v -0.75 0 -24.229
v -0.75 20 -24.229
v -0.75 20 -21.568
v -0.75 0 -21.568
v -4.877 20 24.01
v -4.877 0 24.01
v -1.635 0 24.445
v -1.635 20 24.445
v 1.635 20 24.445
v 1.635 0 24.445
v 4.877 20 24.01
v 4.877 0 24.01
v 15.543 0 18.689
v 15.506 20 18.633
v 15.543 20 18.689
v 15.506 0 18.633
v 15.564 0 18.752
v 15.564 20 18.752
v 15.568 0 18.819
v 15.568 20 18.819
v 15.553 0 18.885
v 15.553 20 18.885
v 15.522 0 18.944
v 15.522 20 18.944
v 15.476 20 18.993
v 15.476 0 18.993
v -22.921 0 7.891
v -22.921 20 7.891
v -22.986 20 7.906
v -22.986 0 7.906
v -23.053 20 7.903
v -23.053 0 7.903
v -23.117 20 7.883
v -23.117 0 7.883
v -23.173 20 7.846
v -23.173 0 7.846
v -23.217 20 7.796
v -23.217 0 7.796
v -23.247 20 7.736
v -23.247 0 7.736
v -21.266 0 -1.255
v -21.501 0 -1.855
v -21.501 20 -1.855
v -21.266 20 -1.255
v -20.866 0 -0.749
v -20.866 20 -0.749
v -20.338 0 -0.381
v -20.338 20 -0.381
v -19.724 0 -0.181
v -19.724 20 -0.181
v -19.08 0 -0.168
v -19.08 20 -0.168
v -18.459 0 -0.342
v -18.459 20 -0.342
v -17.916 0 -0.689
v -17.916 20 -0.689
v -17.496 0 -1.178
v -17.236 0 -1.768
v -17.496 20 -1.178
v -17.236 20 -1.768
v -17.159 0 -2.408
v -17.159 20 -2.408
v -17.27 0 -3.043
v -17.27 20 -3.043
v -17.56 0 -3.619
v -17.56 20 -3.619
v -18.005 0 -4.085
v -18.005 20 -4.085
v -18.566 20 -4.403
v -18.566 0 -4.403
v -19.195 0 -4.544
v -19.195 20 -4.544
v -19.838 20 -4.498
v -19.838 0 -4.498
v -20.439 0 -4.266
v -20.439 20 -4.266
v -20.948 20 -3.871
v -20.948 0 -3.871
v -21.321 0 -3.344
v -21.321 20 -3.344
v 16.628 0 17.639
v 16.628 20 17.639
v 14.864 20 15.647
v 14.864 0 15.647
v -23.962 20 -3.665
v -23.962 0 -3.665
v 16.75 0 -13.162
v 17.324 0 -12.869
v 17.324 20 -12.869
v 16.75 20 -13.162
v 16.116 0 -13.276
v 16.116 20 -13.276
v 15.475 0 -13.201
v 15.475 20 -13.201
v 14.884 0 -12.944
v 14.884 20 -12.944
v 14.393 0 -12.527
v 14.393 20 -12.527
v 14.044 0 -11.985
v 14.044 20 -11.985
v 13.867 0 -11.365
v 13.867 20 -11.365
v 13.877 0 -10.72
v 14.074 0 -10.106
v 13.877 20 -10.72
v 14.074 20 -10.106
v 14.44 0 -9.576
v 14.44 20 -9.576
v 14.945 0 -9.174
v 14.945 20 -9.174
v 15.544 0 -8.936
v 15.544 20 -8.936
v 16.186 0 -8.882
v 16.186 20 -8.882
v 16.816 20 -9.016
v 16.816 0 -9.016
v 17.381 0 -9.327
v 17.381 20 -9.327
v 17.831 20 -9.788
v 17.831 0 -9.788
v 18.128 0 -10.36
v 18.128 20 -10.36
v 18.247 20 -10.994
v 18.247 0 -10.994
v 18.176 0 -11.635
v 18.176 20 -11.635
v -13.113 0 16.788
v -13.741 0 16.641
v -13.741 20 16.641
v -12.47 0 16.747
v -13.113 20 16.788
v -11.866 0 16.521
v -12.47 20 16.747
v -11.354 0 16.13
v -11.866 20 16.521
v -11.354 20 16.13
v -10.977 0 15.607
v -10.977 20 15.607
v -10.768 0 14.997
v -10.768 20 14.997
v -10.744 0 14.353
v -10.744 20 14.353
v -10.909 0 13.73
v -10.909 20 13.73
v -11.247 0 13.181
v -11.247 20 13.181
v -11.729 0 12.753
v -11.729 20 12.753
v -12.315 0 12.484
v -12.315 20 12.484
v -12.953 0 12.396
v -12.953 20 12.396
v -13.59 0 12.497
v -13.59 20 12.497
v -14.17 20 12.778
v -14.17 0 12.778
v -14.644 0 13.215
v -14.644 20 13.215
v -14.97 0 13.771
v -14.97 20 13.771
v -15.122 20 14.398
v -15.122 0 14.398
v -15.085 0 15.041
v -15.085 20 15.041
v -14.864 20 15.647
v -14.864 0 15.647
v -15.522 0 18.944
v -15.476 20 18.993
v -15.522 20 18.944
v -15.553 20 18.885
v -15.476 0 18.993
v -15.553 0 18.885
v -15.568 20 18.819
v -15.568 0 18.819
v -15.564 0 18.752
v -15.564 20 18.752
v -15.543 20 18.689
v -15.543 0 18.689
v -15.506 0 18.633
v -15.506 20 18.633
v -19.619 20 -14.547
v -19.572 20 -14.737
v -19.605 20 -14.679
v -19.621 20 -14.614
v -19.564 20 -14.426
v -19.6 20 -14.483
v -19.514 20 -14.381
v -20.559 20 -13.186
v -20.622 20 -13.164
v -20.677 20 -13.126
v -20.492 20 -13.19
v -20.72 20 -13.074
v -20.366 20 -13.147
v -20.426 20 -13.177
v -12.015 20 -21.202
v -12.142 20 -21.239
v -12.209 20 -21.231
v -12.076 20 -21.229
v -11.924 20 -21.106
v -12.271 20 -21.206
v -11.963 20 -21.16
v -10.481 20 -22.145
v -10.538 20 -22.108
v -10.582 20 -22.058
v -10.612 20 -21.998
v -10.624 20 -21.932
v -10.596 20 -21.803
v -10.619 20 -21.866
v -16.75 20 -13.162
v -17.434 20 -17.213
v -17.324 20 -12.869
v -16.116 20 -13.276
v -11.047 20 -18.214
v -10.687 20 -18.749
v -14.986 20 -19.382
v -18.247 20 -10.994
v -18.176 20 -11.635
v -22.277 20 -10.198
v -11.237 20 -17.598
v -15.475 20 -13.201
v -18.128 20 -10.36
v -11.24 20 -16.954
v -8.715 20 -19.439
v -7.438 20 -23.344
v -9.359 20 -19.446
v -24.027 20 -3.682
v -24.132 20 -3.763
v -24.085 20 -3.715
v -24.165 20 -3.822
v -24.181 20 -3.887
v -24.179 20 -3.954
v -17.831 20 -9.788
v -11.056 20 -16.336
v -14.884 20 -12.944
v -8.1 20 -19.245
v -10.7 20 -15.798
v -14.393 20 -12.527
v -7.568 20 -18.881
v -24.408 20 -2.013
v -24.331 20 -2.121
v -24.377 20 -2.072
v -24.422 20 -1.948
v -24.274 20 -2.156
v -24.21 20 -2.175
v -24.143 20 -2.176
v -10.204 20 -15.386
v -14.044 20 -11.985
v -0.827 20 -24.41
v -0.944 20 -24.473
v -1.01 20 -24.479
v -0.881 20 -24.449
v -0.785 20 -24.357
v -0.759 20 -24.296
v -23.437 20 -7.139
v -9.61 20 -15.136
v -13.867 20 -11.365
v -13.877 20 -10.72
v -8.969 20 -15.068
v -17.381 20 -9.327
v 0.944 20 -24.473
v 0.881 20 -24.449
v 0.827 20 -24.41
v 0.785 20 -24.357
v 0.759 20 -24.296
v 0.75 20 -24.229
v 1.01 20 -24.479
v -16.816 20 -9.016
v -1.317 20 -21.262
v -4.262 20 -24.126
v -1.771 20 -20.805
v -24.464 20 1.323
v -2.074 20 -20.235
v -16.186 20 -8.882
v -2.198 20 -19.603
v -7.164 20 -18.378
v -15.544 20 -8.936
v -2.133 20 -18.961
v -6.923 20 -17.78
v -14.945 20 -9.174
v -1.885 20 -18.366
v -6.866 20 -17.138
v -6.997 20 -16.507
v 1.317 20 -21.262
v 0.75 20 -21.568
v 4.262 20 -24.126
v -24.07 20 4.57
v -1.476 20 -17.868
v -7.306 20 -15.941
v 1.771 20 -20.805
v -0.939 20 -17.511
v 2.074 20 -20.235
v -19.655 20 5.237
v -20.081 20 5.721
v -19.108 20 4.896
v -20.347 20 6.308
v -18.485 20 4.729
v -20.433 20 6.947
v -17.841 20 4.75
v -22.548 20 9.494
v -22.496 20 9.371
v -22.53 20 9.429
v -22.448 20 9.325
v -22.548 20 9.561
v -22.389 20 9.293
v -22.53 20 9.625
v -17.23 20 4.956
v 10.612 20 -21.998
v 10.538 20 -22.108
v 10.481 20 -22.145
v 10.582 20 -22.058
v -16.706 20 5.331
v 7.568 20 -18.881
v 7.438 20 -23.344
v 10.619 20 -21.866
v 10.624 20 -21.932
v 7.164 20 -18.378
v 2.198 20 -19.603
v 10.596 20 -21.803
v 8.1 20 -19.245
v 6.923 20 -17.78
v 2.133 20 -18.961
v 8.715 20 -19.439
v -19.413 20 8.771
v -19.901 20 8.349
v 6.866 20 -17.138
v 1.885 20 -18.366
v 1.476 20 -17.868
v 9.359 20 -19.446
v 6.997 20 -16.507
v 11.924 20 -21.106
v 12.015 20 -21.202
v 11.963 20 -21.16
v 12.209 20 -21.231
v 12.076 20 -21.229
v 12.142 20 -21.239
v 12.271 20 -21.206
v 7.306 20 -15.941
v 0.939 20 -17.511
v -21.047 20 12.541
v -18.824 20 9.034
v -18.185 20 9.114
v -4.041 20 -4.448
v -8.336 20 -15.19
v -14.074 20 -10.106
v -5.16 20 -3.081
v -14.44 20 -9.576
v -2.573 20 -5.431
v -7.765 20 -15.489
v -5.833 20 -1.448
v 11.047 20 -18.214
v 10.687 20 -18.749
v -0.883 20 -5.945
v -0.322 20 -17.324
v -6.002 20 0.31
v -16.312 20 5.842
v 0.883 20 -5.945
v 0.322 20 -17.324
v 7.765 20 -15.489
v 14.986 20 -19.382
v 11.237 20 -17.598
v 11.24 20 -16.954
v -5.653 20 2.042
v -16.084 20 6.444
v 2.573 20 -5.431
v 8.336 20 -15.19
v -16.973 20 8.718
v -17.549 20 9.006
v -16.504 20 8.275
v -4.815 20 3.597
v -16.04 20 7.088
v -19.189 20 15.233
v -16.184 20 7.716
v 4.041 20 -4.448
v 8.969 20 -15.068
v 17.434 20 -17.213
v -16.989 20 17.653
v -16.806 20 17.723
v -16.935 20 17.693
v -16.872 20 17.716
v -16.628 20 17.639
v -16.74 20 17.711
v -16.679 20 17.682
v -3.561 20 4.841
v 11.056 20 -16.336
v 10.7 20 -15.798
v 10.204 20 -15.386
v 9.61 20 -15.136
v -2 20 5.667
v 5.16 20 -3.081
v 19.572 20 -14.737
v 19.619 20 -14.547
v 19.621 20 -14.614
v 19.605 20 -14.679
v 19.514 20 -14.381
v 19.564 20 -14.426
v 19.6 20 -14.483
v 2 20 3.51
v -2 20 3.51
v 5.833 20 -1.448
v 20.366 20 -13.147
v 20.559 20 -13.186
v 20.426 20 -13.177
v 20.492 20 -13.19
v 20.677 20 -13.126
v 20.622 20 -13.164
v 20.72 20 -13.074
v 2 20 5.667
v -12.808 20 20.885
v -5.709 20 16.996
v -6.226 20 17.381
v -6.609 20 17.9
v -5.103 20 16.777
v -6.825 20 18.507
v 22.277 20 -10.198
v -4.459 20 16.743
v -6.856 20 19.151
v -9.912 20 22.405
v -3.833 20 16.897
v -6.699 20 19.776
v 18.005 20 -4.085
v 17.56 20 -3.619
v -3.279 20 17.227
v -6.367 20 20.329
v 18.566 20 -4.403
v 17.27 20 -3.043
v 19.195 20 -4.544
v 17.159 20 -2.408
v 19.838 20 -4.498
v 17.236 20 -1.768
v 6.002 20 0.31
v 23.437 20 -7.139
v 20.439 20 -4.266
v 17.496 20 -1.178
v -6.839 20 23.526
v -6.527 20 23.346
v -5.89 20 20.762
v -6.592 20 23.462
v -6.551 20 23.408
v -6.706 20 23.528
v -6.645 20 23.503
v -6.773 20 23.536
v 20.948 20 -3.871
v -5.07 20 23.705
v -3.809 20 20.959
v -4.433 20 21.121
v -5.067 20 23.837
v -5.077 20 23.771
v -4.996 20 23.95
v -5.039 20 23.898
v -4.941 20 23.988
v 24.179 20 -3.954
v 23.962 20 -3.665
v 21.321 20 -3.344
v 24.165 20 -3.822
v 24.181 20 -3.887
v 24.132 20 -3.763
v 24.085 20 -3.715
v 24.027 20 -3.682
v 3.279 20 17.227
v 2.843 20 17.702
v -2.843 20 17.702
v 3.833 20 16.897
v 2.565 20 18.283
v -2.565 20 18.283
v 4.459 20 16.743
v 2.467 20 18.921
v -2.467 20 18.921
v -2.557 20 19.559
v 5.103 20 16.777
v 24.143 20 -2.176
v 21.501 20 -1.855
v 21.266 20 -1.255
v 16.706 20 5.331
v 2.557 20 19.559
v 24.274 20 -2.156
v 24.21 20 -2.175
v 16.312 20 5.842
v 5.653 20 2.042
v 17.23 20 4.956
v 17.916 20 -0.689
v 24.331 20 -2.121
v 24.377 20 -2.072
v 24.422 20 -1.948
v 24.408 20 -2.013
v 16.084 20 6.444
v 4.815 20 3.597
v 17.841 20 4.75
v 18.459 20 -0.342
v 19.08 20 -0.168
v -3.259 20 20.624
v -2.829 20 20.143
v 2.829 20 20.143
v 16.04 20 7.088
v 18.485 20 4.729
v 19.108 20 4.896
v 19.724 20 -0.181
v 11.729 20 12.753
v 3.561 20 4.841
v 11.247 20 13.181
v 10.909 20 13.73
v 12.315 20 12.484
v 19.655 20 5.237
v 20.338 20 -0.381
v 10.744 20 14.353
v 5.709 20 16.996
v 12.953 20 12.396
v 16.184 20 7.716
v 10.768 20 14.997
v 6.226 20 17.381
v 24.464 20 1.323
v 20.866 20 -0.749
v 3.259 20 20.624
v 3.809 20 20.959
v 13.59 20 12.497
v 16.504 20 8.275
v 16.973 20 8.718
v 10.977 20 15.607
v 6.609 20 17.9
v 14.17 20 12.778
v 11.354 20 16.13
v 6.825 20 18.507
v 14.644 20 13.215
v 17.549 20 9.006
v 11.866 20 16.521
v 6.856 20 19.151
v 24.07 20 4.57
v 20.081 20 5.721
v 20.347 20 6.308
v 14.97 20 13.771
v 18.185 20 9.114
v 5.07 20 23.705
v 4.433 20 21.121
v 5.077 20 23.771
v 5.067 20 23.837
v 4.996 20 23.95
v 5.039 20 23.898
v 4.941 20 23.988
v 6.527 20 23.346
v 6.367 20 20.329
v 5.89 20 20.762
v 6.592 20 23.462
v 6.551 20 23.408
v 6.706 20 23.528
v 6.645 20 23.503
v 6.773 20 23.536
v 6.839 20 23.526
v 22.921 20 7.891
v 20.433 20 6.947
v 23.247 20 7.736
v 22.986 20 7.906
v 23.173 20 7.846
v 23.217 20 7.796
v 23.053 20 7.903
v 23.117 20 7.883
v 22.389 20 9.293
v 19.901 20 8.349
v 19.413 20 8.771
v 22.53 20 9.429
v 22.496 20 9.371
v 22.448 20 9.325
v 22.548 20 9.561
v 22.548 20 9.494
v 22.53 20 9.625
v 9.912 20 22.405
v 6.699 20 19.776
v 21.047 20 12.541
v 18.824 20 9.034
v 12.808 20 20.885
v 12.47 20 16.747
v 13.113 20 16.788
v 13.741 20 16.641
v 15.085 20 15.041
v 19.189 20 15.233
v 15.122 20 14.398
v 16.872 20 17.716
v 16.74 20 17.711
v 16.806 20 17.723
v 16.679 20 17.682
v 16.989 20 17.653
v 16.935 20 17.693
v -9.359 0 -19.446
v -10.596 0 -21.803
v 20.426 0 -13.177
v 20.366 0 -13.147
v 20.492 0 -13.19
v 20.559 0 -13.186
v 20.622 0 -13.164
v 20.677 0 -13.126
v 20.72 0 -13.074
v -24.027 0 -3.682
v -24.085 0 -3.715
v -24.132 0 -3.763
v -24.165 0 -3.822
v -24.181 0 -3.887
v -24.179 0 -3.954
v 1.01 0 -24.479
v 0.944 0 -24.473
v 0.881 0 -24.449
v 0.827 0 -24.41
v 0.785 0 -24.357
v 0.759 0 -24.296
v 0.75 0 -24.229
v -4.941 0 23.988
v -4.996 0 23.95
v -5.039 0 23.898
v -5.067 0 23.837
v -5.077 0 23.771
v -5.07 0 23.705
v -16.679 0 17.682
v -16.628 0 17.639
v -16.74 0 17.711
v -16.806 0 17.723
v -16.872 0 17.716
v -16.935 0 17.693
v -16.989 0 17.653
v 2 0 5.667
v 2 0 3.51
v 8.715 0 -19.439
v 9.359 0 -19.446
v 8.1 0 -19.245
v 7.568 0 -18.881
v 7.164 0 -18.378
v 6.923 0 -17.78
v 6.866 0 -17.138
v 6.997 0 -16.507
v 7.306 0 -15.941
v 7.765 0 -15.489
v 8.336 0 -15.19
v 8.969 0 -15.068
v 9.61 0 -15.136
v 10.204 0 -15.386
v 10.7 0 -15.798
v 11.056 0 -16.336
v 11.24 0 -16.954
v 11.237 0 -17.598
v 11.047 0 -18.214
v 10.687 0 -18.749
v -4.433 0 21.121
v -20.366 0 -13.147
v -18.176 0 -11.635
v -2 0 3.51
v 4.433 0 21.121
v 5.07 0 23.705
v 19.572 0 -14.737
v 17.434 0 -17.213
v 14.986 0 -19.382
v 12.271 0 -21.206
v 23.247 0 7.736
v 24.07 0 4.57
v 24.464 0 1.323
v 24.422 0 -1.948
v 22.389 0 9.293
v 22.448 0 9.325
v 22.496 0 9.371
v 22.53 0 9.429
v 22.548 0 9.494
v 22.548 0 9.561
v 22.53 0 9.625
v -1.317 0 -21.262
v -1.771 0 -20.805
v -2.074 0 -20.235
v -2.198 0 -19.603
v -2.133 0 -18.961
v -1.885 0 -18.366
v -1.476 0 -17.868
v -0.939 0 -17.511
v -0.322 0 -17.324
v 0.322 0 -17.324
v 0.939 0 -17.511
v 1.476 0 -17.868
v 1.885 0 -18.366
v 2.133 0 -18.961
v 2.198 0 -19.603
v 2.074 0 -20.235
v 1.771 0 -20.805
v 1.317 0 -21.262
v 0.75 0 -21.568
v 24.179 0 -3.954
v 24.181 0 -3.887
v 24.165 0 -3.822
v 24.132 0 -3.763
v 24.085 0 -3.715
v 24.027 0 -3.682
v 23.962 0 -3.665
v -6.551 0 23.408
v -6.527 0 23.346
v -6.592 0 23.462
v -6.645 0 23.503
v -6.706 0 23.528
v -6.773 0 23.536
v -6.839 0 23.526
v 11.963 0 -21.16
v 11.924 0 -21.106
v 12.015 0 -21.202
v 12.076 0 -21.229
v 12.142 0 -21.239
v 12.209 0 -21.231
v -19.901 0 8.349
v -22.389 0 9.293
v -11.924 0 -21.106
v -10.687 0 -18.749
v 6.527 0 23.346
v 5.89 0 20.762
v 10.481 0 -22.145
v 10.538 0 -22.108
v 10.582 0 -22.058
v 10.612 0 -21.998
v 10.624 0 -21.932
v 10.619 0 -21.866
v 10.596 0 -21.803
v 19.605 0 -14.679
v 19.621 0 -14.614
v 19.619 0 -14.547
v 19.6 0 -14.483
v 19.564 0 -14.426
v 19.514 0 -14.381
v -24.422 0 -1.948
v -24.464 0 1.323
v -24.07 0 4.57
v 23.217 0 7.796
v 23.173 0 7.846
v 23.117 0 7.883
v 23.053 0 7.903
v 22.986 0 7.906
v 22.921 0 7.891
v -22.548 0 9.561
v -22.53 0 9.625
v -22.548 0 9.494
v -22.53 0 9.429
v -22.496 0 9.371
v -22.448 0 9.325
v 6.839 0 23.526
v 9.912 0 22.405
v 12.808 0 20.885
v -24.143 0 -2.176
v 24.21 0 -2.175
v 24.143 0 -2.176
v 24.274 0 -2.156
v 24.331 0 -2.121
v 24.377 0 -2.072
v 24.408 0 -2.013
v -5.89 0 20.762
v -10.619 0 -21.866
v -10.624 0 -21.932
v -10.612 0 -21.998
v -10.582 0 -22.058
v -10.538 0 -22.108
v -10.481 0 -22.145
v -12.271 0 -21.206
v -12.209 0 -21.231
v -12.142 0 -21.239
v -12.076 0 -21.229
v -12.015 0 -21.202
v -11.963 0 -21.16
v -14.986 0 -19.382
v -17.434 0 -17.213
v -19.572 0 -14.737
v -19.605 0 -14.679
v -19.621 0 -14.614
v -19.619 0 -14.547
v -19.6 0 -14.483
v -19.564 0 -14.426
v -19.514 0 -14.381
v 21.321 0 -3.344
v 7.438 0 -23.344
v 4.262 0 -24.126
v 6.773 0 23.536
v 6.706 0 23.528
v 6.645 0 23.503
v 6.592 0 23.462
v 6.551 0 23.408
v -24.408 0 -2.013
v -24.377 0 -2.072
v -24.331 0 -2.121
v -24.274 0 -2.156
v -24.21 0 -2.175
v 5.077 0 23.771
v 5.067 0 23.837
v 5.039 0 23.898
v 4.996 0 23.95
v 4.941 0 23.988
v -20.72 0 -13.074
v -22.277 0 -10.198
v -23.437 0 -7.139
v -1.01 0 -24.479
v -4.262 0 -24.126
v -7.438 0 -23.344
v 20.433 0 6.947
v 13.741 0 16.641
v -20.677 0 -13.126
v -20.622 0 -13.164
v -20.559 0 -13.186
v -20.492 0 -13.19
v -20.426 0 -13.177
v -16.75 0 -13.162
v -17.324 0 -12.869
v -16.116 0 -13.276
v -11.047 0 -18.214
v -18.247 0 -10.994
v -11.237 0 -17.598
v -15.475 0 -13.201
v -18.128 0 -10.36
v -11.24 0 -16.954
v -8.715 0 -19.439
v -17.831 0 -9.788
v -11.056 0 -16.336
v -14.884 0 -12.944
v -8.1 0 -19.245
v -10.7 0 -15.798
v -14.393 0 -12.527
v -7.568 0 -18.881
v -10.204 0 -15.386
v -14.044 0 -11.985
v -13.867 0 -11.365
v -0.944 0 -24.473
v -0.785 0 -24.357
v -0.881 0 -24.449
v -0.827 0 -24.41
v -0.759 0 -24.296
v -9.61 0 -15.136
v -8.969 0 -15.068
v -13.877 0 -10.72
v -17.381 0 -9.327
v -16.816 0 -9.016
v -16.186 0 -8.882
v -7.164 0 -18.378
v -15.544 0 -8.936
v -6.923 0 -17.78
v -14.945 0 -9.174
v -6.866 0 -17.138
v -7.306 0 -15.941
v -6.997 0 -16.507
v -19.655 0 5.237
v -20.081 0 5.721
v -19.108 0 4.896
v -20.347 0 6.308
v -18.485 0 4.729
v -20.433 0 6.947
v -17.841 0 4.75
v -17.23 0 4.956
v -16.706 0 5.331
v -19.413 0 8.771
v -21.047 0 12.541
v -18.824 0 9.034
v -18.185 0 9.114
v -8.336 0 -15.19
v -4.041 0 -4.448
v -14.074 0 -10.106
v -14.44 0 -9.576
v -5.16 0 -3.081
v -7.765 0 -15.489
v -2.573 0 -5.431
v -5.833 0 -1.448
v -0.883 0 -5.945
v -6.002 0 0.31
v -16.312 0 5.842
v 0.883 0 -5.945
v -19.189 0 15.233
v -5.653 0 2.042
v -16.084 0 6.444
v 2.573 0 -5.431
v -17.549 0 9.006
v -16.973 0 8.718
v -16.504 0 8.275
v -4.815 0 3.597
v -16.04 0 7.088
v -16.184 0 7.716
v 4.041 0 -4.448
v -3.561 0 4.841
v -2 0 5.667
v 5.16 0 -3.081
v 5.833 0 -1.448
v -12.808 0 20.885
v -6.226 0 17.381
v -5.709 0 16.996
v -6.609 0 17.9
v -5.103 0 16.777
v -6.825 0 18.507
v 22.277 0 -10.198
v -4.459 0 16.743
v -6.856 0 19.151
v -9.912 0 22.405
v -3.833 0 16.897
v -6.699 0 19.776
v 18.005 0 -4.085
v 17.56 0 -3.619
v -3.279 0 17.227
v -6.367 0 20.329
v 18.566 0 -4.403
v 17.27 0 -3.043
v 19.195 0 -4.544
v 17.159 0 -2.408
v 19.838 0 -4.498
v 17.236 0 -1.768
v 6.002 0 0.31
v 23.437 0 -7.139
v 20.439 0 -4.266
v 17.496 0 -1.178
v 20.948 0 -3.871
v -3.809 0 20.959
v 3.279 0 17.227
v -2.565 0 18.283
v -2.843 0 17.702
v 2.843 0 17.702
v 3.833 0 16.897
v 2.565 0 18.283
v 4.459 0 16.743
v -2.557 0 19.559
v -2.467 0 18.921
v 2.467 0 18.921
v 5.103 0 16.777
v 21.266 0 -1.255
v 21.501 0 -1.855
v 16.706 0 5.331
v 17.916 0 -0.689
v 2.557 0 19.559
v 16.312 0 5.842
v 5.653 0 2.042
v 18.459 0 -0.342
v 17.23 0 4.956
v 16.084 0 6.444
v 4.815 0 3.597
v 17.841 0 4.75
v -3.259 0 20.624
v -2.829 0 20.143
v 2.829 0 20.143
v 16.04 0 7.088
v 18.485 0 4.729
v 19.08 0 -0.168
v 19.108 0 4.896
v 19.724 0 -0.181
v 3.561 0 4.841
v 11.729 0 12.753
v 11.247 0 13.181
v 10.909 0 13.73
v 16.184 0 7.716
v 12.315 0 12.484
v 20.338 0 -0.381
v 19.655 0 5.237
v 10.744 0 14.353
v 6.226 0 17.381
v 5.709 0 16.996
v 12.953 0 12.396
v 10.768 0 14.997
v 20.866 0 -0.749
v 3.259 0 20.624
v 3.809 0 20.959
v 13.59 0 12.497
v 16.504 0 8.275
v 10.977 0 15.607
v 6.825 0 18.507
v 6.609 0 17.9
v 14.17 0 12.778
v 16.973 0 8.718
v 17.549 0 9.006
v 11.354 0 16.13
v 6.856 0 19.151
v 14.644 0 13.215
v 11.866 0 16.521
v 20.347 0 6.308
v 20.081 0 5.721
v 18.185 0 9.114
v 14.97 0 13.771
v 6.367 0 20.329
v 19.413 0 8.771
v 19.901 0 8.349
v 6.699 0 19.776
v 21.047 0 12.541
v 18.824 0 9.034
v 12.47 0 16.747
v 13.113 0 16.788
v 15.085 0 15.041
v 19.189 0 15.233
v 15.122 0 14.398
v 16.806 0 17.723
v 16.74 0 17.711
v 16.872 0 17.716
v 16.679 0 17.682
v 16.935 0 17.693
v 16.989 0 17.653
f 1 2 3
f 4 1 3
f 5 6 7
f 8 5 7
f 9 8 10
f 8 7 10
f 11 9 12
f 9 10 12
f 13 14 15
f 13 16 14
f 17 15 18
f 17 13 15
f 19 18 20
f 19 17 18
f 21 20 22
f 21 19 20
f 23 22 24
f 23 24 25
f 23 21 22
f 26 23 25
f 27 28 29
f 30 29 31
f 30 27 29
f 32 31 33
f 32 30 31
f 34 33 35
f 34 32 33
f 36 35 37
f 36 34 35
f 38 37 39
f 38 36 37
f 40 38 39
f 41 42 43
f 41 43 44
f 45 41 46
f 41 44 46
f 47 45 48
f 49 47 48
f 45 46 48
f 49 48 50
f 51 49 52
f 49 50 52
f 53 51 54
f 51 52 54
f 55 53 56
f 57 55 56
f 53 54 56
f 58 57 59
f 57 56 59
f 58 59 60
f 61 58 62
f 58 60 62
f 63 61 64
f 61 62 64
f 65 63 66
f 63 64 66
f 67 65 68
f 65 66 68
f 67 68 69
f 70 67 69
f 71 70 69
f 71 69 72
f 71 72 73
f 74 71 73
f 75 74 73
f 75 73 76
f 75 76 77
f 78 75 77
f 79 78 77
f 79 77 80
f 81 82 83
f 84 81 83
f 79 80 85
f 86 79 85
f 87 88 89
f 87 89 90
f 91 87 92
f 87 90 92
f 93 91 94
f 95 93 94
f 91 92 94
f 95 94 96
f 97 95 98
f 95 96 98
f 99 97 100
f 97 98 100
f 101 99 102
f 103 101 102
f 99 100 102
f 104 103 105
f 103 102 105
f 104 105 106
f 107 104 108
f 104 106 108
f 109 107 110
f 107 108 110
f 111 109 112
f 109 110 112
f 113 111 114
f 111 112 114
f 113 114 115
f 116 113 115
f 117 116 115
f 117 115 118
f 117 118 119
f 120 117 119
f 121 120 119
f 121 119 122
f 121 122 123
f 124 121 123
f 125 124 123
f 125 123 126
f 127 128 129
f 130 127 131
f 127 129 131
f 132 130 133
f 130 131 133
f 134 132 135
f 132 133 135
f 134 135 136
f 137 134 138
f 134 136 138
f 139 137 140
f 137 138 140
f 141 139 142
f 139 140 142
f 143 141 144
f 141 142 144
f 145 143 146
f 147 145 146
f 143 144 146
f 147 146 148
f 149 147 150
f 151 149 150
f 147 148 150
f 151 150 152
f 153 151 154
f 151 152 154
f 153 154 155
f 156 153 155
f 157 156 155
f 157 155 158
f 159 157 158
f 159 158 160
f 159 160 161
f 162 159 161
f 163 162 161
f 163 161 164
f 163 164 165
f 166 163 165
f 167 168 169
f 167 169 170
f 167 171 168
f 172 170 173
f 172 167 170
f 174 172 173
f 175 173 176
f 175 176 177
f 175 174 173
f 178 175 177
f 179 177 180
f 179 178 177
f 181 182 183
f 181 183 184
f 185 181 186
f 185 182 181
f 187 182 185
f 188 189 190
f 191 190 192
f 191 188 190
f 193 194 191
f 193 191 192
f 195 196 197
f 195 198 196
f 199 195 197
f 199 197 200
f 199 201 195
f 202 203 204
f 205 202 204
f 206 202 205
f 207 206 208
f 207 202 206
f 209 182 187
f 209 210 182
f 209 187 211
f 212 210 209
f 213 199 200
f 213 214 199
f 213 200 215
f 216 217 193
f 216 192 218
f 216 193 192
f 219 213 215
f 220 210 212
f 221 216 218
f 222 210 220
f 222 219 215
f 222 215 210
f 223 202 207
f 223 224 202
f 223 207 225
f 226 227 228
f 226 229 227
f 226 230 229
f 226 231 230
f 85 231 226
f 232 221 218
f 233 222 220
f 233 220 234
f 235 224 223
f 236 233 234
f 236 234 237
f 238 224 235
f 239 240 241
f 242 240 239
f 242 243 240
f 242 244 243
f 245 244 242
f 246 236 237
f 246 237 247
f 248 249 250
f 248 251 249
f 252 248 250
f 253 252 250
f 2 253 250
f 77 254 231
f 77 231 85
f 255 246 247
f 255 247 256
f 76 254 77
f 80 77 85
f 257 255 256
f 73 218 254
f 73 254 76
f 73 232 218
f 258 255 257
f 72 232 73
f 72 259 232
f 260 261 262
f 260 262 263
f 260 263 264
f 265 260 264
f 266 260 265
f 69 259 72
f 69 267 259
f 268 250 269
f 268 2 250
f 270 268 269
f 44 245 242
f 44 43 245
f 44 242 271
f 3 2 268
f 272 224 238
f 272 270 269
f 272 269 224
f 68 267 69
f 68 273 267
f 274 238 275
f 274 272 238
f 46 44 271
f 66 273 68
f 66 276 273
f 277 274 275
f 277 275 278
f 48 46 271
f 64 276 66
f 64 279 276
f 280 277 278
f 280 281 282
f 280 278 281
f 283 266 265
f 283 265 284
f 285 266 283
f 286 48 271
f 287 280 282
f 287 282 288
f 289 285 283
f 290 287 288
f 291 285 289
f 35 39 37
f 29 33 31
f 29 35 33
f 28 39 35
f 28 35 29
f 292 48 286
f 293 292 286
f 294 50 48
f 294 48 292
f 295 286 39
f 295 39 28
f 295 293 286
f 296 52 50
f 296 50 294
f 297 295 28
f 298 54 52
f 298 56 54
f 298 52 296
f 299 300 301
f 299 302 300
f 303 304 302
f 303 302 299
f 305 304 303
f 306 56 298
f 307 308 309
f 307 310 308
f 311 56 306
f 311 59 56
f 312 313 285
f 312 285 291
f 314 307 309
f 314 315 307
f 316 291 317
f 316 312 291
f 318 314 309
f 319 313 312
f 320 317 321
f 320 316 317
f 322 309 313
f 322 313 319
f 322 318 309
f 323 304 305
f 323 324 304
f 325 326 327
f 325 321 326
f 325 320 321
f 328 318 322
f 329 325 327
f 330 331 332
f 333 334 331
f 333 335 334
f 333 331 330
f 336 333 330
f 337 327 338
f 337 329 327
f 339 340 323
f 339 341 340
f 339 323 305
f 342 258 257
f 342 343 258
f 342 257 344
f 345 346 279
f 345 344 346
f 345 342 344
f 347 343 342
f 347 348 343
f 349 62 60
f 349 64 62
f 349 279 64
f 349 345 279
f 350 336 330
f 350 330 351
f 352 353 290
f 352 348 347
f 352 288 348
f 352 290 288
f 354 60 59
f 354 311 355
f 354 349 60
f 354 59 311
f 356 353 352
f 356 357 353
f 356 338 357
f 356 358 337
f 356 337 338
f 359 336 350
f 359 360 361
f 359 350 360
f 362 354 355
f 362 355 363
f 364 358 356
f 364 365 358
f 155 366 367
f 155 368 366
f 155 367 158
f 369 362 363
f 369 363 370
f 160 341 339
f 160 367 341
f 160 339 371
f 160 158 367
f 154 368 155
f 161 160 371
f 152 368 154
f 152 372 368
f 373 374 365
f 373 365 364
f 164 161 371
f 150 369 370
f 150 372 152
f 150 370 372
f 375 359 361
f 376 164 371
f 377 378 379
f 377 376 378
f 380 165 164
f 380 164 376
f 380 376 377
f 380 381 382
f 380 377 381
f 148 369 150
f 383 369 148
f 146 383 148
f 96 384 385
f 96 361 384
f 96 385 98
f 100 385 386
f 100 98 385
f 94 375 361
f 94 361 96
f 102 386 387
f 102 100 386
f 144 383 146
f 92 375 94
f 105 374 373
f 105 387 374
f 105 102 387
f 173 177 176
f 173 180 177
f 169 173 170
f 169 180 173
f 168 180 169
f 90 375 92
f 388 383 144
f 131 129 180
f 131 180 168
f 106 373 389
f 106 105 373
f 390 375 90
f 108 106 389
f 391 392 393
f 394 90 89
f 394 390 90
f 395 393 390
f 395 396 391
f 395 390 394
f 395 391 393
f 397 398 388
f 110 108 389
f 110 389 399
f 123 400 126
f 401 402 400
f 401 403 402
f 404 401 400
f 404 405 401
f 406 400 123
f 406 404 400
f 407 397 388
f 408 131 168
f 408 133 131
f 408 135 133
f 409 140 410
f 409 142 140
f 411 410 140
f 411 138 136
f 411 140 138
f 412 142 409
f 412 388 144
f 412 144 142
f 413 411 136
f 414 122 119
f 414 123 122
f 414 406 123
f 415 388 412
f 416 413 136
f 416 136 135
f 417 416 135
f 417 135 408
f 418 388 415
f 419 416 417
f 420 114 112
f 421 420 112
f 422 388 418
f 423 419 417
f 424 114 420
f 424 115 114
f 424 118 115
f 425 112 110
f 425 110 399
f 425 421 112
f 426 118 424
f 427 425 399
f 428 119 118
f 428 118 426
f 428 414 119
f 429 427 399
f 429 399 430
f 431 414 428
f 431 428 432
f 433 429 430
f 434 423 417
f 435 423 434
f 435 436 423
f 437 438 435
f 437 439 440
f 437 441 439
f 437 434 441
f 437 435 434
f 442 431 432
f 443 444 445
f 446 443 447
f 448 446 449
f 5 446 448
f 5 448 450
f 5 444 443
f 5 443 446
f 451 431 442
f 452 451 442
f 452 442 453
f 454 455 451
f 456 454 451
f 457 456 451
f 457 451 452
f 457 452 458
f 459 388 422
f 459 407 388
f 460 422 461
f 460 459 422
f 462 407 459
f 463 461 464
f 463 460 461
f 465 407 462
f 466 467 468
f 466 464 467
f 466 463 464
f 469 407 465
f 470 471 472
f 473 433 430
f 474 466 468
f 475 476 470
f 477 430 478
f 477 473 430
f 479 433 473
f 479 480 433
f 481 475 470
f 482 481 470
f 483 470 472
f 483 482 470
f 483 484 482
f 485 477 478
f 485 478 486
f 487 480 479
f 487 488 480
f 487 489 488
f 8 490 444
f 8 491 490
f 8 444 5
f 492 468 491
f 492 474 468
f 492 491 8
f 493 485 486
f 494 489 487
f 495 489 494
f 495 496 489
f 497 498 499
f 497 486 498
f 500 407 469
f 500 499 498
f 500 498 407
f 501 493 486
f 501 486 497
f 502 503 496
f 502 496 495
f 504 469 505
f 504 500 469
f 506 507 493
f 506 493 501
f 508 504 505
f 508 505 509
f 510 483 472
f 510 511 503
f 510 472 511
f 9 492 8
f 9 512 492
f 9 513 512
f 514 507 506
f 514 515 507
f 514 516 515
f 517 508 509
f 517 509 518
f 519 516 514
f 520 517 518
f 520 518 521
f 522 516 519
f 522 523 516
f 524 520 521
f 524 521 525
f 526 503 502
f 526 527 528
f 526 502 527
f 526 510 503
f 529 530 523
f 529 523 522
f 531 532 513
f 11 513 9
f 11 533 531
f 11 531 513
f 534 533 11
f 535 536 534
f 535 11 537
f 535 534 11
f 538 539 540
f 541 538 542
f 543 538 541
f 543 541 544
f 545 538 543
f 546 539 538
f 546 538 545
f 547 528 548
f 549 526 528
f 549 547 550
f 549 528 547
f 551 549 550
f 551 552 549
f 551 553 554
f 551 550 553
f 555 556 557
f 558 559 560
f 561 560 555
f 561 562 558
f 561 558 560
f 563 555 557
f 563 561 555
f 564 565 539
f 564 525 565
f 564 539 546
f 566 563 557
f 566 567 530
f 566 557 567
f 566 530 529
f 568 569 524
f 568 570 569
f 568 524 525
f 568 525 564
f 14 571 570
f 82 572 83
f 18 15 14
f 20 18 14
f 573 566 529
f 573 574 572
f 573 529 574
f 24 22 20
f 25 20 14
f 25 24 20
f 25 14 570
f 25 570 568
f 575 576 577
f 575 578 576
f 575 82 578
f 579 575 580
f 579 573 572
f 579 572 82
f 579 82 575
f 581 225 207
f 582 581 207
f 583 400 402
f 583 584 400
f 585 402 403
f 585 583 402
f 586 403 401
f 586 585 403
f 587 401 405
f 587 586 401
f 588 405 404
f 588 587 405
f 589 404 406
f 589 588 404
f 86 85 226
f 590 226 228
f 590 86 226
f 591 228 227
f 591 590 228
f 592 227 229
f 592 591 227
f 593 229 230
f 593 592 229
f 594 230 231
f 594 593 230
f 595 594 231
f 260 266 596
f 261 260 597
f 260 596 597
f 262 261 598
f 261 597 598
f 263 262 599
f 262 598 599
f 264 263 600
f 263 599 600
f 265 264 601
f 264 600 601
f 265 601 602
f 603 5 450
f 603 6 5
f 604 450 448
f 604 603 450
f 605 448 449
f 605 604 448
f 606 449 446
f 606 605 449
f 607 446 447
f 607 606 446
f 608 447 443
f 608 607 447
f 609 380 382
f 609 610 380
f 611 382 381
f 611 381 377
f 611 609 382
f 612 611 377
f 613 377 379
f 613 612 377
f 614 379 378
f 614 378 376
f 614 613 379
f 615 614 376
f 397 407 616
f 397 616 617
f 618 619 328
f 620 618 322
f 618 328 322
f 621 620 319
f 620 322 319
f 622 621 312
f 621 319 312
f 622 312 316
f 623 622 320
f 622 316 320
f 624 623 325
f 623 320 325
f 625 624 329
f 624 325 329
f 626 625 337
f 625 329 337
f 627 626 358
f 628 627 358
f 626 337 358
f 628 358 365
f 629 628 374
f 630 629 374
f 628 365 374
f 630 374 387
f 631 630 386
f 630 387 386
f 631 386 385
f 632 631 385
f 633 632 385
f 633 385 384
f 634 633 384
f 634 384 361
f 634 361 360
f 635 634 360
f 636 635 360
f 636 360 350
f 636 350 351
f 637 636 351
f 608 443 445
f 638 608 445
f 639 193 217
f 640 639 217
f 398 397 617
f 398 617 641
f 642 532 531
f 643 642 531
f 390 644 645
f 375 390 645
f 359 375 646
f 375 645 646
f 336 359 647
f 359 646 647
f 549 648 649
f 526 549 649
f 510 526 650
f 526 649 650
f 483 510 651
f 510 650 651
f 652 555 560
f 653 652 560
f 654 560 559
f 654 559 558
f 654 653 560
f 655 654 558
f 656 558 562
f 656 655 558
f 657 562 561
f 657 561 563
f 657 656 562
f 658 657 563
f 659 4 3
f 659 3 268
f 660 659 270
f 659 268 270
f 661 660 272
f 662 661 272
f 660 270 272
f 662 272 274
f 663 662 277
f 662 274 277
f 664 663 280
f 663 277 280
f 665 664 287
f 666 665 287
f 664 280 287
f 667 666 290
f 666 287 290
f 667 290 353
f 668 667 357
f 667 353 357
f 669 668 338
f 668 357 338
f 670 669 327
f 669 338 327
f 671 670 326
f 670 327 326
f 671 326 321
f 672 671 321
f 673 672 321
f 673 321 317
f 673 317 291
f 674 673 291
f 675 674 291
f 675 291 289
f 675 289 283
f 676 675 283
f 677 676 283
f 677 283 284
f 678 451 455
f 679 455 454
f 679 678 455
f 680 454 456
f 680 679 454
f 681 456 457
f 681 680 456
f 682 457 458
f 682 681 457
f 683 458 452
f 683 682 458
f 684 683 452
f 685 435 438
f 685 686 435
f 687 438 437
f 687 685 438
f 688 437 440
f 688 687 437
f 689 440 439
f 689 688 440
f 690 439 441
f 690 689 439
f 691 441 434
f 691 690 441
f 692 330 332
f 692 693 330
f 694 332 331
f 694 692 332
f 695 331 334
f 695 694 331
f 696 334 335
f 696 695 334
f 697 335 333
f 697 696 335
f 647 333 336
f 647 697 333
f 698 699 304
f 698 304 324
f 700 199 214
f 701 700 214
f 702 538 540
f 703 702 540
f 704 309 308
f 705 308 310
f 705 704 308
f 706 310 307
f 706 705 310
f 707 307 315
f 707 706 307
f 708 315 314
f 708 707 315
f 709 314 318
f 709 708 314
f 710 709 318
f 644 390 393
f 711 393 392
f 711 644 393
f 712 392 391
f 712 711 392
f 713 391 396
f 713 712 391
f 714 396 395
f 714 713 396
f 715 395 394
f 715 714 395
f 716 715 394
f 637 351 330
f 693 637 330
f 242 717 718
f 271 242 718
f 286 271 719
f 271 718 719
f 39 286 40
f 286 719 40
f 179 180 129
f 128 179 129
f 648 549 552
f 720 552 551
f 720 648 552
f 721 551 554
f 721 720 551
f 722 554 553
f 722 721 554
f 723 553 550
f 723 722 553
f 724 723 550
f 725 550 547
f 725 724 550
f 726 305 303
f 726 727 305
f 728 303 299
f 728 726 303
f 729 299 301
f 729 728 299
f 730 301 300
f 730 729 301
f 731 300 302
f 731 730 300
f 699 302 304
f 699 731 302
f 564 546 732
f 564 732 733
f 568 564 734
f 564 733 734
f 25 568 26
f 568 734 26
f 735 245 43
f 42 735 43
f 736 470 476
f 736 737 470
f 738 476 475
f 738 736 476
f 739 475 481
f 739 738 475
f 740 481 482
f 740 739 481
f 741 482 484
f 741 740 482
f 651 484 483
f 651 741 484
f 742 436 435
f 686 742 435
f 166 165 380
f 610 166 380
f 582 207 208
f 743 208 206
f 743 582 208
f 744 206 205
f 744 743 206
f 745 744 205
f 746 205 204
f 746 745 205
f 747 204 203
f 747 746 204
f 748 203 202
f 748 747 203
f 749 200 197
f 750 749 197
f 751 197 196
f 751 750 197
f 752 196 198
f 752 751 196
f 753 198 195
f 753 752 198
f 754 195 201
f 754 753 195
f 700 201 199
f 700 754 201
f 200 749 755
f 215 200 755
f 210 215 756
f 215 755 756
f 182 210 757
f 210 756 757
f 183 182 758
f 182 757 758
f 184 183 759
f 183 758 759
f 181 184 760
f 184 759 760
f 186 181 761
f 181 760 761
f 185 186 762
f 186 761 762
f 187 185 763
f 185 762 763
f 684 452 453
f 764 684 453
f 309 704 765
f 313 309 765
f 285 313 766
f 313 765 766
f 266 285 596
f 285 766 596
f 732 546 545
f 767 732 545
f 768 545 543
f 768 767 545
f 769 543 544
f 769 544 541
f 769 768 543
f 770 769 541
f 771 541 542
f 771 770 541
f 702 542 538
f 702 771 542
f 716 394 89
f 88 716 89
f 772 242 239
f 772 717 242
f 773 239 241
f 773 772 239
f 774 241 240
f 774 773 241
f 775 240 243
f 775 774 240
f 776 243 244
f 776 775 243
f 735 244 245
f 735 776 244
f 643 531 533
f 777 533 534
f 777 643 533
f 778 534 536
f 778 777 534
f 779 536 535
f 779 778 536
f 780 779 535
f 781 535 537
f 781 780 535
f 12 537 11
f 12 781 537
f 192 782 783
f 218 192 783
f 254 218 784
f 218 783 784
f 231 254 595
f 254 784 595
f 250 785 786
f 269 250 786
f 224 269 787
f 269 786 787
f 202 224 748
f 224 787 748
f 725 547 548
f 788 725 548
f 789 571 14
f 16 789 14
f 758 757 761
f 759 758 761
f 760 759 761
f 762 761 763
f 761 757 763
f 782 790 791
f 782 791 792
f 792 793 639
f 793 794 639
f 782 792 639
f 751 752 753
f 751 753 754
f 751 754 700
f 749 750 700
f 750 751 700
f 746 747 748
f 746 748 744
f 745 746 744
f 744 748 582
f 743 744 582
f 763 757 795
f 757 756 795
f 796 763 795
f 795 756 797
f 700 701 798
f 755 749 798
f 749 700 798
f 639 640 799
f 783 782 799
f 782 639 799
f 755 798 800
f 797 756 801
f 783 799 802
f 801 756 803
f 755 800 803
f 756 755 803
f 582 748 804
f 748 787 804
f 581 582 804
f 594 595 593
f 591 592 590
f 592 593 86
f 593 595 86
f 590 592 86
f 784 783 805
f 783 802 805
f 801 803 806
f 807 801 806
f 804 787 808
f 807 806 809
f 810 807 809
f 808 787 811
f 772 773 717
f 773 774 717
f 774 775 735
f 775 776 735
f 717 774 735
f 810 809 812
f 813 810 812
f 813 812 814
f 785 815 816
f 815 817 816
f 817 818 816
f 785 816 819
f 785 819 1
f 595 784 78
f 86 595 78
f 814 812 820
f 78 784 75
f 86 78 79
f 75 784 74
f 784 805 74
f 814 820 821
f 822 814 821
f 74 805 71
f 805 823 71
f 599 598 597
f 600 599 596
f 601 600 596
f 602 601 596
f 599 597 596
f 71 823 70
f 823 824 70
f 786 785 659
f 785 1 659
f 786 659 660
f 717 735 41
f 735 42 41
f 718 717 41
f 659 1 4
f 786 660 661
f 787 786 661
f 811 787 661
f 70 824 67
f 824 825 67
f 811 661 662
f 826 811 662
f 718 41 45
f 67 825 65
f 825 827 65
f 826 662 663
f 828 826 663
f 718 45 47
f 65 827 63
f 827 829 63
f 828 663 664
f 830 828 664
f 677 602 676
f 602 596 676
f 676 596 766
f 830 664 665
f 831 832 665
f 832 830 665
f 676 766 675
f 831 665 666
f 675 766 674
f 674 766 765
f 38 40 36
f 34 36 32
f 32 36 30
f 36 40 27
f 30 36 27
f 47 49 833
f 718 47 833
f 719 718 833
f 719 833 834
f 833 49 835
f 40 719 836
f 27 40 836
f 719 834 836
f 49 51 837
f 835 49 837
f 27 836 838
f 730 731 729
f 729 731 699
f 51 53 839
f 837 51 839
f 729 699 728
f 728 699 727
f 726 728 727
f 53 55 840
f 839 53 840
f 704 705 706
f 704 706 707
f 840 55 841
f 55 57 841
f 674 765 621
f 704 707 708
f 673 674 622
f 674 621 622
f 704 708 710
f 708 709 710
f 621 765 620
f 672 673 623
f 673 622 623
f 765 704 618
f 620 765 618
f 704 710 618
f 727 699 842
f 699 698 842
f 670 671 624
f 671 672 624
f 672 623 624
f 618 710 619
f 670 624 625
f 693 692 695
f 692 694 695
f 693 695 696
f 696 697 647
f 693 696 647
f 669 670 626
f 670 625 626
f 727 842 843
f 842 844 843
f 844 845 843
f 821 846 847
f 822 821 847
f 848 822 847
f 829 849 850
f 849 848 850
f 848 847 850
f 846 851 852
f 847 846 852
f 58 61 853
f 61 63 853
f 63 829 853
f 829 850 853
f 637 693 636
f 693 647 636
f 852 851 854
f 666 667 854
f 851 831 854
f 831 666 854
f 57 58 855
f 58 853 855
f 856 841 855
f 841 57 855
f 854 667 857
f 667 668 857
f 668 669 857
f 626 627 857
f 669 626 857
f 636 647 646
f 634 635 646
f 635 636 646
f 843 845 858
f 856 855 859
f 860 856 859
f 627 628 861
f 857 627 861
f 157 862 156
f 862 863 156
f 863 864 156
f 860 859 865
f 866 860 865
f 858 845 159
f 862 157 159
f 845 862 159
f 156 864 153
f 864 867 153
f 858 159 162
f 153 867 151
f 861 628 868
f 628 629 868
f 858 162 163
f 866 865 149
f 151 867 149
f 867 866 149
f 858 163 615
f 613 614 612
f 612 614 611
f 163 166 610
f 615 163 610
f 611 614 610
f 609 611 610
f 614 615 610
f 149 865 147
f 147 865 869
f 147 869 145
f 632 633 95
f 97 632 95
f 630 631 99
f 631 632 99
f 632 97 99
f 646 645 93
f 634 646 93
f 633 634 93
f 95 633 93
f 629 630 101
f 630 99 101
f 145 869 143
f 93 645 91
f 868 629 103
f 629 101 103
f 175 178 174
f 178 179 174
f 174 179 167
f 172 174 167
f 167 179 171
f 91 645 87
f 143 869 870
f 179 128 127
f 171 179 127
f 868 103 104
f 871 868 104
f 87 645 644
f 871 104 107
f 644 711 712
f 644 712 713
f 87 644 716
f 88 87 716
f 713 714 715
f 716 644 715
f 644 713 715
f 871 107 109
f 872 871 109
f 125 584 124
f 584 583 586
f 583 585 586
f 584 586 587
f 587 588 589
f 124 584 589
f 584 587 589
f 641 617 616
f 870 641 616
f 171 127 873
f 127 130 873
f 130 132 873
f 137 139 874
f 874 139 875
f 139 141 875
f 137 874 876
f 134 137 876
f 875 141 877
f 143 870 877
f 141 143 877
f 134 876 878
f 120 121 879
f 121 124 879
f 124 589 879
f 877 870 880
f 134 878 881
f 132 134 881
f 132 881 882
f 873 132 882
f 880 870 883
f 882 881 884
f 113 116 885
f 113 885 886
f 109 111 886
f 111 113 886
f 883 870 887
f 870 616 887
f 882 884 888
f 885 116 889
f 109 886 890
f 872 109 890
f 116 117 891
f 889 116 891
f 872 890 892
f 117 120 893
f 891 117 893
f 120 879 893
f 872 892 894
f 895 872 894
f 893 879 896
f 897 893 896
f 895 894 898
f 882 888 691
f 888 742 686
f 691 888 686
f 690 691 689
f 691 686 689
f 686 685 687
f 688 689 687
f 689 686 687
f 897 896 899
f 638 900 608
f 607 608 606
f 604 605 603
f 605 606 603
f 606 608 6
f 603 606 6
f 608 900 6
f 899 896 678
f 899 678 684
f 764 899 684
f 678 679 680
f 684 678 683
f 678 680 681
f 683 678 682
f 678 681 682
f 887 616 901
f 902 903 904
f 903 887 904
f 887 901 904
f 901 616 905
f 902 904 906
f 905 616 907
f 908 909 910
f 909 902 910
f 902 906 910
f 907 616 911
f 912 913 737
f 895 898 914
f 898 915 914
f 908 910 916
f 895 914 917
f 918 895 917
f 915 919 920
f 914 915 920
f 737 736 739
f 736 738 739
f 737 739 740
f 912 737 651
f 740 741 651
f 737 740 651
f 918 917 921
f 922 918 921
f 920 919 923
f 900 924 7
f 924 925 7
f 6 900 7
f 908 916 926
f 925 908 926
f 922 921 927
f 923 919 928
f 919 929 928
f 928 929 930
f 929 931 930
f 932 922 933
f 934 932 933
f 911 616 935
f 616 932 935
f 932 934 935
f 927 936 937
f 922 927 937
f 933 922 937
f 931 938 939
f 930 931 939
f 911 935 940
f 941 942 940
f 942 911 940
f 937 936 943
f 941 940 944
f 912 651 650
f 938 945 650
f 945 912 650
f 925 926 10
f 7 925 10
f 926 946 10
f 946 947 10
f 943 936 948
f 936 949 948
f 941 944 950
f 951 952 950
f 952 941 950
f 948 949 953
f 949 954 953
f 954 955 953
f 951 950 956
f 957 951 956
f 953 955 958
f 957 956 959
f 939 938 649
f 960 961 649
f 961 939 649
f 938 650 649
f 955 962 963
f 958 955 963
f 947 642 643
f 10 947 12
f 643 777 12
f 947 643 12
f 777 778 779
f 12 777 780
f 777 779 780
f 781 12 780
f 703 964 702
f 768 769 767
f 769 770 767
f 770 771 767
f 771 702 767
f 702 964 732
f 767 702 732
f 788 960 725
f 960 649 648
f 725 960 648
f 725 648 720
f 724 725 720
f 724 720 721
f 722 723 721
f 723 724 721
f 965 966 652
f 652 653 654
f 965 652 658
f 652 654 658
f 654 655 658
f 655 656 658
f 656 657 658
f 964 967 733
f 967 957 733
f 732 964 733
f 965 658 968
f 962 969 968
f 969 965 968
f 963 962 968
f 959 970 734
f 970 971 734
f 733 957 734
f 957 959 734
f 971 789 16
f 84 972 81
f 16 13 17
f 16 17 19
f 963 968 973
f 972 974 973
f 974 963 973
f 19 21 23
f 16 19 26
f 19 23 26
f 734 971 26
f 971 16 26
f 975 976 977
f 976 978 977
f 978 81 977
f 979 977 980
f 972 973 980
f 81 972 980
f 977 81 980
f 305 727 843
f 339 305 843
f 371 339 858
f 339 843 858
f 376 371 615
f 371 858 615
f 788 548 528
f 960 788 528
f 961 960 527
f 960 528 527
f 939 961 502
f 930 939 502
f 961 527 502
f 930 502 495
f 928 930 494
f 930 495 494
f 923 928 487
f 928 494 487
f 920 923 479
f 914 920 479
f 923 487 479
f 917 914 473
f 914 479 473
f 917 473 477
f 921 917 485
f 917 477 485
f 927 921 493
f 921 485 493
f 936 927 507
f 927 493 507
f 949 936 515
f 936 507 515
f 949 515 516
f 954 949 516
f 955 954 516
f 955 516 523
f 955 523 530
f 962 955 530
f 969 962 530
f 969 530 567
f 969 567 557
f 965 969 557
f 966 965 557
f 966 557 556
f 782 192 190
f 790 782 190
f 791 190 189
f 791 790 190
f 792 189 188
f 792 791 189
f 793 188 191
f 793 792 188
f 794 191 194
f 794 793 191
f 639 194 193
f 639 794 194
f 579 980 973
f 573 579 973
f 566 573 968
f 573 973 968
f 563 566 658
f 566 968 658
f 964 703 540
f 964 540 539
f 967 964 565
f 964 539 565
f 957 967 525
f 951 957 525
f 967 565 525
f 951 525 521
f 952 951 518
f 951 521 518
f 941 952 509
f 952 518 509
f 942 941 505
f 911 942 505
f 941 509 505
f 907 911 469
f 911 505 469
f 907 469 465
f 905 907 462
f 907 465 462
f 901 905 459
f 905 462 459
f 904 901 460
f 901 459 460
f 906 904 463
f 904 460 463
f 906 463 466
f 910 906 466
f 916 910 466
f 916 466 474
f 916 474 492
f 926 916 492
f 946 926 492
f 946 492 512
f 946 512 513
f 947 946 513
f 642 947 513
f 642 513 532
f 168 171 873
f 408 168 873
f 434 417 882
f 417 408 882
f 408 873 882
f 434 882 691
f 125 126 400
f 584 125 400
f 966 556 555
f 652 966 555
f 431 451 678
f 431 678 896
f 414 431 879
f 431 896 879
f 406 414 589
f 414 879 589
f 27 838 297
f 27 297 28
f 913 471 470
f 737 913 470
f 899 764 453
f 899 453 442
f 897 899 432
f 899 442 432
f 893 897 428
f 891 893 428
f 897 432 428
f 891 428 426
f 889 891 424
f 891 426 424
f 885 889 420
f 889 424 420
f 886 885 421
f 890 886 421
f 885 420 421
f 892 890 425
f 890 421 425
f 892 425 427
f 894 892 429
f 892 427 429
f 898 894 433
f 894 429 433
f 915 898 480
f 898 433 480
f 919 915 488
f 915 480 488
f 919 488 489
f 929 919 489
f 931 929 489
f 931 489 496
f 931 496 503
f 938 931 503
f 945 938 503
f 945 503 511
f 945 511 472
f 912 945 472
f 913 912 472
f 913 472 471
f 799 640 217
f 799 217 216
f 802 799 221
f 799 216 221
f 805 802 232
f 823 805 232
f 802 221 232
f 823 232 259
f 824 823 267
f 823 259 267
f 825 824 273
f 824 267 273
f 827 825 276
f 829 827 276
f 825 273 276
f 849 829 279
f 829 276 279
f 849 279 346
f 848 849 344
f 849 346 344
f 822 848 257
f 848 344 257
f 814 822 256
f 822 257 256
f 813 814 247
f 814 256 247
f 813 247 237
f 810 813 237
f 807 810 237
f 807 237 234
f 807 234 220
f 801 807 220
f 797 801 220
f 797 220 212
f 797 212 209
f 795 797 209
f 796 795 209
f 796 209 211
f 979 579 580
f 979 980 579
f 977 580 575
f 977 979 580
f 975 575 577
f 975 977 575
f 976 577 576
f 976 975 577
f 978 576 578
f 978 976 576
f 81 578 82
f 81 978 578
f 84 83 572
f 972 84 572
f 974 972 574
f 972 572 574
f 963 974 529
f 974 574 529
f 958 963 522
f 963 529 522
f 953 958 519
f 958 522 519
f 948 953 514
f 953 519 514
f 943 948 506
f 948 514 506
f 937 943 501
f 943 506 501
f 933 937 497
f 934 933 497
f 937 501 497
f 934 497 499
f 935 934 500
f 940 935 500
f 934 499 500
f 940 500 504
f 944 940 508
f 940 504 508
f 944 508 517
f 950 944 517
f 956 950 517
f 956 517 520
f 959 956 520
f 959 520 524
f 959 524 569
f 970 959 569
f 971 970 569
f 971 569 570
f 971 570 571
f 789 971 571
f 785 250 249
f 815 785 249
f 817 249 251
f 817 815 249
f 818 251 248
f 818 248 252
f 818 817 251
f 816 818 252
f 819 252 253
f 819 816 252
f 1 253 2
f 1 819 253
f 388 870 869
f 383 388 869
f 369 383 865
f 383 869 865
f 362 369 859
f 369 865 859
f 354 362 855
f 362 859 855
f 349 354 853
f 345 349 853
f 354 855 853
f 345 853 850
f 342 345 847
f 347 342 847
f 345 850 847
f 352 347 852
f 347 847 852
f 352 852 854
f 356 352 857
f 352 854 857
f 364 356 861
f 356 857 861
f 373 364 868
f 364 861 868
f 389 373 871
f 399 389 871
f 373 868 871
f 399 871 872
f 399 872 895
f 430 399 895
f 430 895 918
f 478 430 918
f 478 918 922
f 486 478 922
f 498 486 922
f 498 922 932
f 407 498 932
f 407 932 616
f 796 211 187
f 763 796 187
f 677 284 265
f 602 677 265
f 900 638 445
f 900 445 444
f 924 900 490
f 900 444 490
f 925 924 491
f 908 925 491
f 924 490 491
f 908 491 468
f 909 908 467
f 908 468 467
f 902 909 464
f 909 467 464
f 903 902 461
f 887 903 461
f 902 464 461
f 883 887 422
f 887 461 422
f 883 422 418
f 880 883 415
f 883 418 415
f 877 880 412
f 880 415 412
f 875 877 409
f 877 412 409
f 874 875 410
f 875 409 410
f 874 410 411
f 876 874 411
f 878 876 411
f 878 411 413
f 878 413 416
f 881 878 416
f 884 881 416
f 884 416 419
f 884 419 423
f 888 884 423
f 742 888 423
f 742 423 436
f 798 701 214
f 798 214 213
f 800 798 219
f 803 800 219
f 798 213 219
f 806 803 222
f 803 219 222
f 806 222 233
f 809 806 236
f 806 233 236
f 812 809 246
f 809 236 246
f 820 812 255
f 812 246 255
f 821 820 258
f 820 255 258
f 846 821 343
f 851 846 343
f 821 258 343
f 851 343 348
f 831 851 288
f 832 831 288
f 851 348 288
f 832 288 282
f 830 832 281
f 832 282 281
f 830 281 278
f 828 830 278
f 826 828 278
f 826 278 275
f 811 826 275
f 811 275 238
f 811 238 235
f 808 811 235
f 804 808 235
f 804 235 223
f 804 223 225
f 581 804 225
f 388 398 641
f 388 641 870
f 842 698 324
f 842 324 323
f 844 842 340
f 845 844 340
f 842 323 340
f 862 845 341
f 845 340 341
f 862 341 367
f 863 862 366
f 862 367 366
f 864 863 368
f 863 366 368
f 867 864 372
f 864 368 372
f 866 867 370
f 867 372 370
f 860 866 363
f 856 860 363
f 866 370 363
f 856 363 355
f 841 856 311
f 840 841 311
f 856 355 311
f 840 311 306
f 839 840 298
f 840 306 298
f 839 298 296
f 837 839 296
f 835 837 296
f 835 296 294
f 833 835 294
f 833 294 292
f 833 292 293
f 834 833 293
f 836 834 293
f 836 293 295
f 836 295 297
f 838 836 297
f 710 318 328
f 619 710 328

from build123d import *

# Parameters (mm, degrees)
SKETCH1_R                = 24.5
BOSS_EXTRUDE1_DEPTH      = 20
CUT_EXTRUDE1_DEPTH       = 41.006249512
FILLET1_R                = 0.25
CIRPATTERN1_COUNT        = 13
FILLET1_OF_CIRPATTERN1_R = 0.25


with BuildPart() as part:
    # Sketch1 → Boss-Extrude1 (new body)
    with BuildSketch(Plane(origin=(0, 0, 0), x_dir=(1, 0, 0), z_dir=(0, 1, 0))):
        with Locations(Location((0, 0, 0), (0, 0, 270))):
            Circle(SKETCH1_R)
        with BuildLine():
            Line((2, -5.667459748), (2, -3.51))
            Line((2, -3.51), (-2, -3.51))
            Line((-2, -3.51), (-2, -5.667459748))
            ThreePointArc((-2, -5.667459748), (0, 6.01), (2, -5.667459748))
        make_face(mode=Mode.SUBTRACT)
    extrude(amount=BOSS_EXTRUDE1_DEPTH)

    # Sketch3 → Cut-Extrude1 (cut, through all)
    with BuildSketch(Plane(origin=(0, 20, 0), x_dir=(1, 0, 0), z_dir=(0, 1, 0))):
        with BuildLine():
            Line((0.75, 21.568211788), (0.75, 24.5))
            Line((0.75, 24.5), (-0.75, 24.5))
            Line((-0.75, 24.5), (-0.75, 21.568211788))
            ThreePointArc((-0.75, 21.568211788), (0, 17.3), (0.75, 21.568211788))
        make_face()
    cut_extrude1 = extrude(amount=-CUT_EXTRUDE1_DEPTH, mode=Mode.SUBTRACT)

    # Fillet1
    fillet1_edges = [part.edges().sort_by_distance(p)[0] for p in [
        (0.75, 10, -24.488517717),
        (-0.75, 10, -24.488517717),
    ]]
    fillet(fillet1_edges, radius=FILLET1_R)

    # CirPattern1: Cut-Extrude1 ×13 about axis
    cirpattern1_axis = Axis((0, 0, 0), (0, 1, 0))
    for i in range(1, CIRPATTERN1_COUNT):
        add(cut_extrude1.rotate(cirpattern1_axis, i * 360 / CIRPATTERN1_COUNT), mode=Mode.SUBTRACT)

    # Fillet1 of CirPattern1
    fillet1_of_cirpattern1_edges = [part.edges().sort_by_distance(p)[0] for p in [
        (-10.716289613, 10, -22.032047951),
        (-12.044473652, 10, -21.334963193),
        (-19.727606421, 10, -14.528301514),
        (-20.579703541, 10, -13.293825716),
        (-24.219566341, 10, -3.696296286),
        (-24.400371362, 10, -2.207232974),
        (-23.16311549, 10, 7.982485877),
        (-22.63120816, 10, 9.385010241),
        (-16.800274026, 10, 17.832576725),
        (-15.677507904, 10, 18.827260712),
        (-6.588692248, 10, 23.59743915),
        (-5.132279522, 10, 23.956412647),
        (5.132279522, 10, 23.956412647),
        (6.588692248, 10, 23.59743915),
        (15.677507904, 10, 18.827260712),
        (16.800274026, 10, 17.832576725),
        (22.63120816, 10, 9.385010241),
        (23.16311549, 10, 7.982485877),
        (24.400371362, 10, -2.207232974),
        (24.219566341, 10, -3.696296286),
        (20.579703541, 10, -13.293825716),
        (19.727606421, 10, -14.528301514),
        (12.044473652, 10, -21.334963193),
        (10.716289613, 10, -22.032047951),
    ]]
    fillet(fillet1_of_cirpattern1_edges, radius=FILLET1_OF_CIRPATTERN1_R)


solid = part.part
